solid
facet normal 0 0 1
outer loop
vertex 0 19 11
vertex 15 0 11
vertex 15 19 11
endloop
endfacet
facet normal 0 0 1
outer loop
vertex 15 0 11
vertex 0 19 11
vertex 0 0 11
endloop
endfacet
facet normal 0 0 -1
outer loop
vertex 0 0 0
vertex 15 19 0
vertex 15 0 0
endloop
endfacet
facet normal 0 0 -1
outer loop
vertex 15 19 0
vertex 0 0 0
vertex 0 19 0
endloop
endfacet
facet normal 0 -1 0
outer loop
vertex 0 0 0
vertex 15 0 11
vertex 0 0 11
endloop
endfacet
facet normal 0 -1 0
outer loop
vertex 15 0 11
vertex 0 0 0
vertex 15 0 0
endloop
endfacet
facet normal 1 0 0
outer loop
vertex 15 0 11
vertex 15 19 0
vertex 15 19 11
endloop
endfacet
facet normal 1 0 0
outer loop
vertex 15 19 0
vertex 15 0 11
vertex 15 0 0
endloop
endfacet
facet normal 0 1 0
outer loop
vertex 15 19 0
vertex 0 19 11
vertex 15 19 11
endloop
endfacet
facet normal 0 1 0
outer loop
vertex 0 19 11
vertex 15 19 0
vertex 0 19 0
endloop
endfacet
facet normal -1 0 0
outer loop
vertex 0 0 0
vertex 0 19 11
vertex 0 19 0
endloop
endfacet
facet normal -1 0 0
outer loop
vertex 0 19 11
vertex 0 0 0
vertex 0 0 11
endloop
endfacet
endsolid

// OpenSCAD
// Generated by SolidPython 1.0.1 on 2020-07-29 00:46:56


cube(size = [15, 19, 11]);
/***********************************************
*********      SolidPython code:      **********
************************************************
 
# import packages: SolidPython
from solid import *
from solid.utils import *
from itertools import chain, combinations, permutations


class Resize:

    def __init__(self, scad_file):
        self.scad_file = scad_file
        #self.scad_file = import_scad(scad_file)
        # cone/cylinder param:
        self.r1 = 0
        self.r2 = 0
        self.h = 0
        # rectangular prism param:
        self.w = 0
        self.l = 0
        # ellipse param:
        self.r = 0

    # import OpenScad code (file name corresponds to shape)


    # classify shape + parameters
    def assign(self, param1, param2, param3):
        if self.scad_file == 'cone.scad':
            self.r1 = param1
            self.r2 = param2
            self.h = param3
        elif self.scad_file == 'cylinder.scad':
            self.r1 = param1
            self.r2 = param2
            self.h = param3
        elif self.scad_file == 'rectangularPrism.scad':
            self.h = param1
            self.l = param2
            self.w = param3
        else:
            self.r = param1
            self.h = param2

    # resize parameters
    def iterate(self):
        x = range(3, 20, 2)
        i = 1
        if self.scad_file == 'cone.scad':
            tempList = list(permutations(x, 2))
            for temp in tempList:
                param1 = temp[0]
                param2 = temp[1]
                filepath = 'produced_scad_files/' + 'cone' + str(param1) + '_' + str(param2) + '_' + '.scad'
                scad_render_to_file(cylinder(h=param1, r1=param2, r2=0), filepath)

        elif self.scad_file == 'cylinder.scad':
            tempList = list(permutations(x, 3))
            for temp in tempList:
                param1 = temp[0]
                param2 = temp[1]
                filepath = 'produced_scad_files/' + 'cylinder' + str(param1) + '_' + str(param2) + '_' + '.scad'
                scad_render_to_file(cylinder(h=param1, r1=param2, r2=param2), filepath)

        elif self.scad_file == 'rectangularPrism.scad':
            tempList = list(permutations(x, 3))
            for temp in tempList:
                param1 = temp[0]
                param2 = temp[1]
                param3 = temp[2]
                filepath = 'produced_scad_files/' + 'rectangularPrism' + str(param1) + '_' + str(param2) + '_' + str(
                    param3) + '.scad'
                scad_render_to_file(cube(size=(param1, param2, param3)), filepath)

        elif self.scad_file == 'ellipse.scad':
            tempList = list(permutations(x, 4))
            for temp in tempList:
                param1 = temp[0]
                param2 = temp[1]
                param3 = temp[2]
                param4 = temp[3]
                filepath = 'produced_scad_files/' + 'ellipse' + str(param1) + '_' + str(param2) + '_' + str(param3) + '_' + str(param4) + '.scad'
                scad_render_to_file(scale([param1, param2, param3])(sphere(r=param4)), filepath)

    def render_to_scadfile(self):
        scad_render_to_file(scad, 'example.scad') 
 
************************************************/
